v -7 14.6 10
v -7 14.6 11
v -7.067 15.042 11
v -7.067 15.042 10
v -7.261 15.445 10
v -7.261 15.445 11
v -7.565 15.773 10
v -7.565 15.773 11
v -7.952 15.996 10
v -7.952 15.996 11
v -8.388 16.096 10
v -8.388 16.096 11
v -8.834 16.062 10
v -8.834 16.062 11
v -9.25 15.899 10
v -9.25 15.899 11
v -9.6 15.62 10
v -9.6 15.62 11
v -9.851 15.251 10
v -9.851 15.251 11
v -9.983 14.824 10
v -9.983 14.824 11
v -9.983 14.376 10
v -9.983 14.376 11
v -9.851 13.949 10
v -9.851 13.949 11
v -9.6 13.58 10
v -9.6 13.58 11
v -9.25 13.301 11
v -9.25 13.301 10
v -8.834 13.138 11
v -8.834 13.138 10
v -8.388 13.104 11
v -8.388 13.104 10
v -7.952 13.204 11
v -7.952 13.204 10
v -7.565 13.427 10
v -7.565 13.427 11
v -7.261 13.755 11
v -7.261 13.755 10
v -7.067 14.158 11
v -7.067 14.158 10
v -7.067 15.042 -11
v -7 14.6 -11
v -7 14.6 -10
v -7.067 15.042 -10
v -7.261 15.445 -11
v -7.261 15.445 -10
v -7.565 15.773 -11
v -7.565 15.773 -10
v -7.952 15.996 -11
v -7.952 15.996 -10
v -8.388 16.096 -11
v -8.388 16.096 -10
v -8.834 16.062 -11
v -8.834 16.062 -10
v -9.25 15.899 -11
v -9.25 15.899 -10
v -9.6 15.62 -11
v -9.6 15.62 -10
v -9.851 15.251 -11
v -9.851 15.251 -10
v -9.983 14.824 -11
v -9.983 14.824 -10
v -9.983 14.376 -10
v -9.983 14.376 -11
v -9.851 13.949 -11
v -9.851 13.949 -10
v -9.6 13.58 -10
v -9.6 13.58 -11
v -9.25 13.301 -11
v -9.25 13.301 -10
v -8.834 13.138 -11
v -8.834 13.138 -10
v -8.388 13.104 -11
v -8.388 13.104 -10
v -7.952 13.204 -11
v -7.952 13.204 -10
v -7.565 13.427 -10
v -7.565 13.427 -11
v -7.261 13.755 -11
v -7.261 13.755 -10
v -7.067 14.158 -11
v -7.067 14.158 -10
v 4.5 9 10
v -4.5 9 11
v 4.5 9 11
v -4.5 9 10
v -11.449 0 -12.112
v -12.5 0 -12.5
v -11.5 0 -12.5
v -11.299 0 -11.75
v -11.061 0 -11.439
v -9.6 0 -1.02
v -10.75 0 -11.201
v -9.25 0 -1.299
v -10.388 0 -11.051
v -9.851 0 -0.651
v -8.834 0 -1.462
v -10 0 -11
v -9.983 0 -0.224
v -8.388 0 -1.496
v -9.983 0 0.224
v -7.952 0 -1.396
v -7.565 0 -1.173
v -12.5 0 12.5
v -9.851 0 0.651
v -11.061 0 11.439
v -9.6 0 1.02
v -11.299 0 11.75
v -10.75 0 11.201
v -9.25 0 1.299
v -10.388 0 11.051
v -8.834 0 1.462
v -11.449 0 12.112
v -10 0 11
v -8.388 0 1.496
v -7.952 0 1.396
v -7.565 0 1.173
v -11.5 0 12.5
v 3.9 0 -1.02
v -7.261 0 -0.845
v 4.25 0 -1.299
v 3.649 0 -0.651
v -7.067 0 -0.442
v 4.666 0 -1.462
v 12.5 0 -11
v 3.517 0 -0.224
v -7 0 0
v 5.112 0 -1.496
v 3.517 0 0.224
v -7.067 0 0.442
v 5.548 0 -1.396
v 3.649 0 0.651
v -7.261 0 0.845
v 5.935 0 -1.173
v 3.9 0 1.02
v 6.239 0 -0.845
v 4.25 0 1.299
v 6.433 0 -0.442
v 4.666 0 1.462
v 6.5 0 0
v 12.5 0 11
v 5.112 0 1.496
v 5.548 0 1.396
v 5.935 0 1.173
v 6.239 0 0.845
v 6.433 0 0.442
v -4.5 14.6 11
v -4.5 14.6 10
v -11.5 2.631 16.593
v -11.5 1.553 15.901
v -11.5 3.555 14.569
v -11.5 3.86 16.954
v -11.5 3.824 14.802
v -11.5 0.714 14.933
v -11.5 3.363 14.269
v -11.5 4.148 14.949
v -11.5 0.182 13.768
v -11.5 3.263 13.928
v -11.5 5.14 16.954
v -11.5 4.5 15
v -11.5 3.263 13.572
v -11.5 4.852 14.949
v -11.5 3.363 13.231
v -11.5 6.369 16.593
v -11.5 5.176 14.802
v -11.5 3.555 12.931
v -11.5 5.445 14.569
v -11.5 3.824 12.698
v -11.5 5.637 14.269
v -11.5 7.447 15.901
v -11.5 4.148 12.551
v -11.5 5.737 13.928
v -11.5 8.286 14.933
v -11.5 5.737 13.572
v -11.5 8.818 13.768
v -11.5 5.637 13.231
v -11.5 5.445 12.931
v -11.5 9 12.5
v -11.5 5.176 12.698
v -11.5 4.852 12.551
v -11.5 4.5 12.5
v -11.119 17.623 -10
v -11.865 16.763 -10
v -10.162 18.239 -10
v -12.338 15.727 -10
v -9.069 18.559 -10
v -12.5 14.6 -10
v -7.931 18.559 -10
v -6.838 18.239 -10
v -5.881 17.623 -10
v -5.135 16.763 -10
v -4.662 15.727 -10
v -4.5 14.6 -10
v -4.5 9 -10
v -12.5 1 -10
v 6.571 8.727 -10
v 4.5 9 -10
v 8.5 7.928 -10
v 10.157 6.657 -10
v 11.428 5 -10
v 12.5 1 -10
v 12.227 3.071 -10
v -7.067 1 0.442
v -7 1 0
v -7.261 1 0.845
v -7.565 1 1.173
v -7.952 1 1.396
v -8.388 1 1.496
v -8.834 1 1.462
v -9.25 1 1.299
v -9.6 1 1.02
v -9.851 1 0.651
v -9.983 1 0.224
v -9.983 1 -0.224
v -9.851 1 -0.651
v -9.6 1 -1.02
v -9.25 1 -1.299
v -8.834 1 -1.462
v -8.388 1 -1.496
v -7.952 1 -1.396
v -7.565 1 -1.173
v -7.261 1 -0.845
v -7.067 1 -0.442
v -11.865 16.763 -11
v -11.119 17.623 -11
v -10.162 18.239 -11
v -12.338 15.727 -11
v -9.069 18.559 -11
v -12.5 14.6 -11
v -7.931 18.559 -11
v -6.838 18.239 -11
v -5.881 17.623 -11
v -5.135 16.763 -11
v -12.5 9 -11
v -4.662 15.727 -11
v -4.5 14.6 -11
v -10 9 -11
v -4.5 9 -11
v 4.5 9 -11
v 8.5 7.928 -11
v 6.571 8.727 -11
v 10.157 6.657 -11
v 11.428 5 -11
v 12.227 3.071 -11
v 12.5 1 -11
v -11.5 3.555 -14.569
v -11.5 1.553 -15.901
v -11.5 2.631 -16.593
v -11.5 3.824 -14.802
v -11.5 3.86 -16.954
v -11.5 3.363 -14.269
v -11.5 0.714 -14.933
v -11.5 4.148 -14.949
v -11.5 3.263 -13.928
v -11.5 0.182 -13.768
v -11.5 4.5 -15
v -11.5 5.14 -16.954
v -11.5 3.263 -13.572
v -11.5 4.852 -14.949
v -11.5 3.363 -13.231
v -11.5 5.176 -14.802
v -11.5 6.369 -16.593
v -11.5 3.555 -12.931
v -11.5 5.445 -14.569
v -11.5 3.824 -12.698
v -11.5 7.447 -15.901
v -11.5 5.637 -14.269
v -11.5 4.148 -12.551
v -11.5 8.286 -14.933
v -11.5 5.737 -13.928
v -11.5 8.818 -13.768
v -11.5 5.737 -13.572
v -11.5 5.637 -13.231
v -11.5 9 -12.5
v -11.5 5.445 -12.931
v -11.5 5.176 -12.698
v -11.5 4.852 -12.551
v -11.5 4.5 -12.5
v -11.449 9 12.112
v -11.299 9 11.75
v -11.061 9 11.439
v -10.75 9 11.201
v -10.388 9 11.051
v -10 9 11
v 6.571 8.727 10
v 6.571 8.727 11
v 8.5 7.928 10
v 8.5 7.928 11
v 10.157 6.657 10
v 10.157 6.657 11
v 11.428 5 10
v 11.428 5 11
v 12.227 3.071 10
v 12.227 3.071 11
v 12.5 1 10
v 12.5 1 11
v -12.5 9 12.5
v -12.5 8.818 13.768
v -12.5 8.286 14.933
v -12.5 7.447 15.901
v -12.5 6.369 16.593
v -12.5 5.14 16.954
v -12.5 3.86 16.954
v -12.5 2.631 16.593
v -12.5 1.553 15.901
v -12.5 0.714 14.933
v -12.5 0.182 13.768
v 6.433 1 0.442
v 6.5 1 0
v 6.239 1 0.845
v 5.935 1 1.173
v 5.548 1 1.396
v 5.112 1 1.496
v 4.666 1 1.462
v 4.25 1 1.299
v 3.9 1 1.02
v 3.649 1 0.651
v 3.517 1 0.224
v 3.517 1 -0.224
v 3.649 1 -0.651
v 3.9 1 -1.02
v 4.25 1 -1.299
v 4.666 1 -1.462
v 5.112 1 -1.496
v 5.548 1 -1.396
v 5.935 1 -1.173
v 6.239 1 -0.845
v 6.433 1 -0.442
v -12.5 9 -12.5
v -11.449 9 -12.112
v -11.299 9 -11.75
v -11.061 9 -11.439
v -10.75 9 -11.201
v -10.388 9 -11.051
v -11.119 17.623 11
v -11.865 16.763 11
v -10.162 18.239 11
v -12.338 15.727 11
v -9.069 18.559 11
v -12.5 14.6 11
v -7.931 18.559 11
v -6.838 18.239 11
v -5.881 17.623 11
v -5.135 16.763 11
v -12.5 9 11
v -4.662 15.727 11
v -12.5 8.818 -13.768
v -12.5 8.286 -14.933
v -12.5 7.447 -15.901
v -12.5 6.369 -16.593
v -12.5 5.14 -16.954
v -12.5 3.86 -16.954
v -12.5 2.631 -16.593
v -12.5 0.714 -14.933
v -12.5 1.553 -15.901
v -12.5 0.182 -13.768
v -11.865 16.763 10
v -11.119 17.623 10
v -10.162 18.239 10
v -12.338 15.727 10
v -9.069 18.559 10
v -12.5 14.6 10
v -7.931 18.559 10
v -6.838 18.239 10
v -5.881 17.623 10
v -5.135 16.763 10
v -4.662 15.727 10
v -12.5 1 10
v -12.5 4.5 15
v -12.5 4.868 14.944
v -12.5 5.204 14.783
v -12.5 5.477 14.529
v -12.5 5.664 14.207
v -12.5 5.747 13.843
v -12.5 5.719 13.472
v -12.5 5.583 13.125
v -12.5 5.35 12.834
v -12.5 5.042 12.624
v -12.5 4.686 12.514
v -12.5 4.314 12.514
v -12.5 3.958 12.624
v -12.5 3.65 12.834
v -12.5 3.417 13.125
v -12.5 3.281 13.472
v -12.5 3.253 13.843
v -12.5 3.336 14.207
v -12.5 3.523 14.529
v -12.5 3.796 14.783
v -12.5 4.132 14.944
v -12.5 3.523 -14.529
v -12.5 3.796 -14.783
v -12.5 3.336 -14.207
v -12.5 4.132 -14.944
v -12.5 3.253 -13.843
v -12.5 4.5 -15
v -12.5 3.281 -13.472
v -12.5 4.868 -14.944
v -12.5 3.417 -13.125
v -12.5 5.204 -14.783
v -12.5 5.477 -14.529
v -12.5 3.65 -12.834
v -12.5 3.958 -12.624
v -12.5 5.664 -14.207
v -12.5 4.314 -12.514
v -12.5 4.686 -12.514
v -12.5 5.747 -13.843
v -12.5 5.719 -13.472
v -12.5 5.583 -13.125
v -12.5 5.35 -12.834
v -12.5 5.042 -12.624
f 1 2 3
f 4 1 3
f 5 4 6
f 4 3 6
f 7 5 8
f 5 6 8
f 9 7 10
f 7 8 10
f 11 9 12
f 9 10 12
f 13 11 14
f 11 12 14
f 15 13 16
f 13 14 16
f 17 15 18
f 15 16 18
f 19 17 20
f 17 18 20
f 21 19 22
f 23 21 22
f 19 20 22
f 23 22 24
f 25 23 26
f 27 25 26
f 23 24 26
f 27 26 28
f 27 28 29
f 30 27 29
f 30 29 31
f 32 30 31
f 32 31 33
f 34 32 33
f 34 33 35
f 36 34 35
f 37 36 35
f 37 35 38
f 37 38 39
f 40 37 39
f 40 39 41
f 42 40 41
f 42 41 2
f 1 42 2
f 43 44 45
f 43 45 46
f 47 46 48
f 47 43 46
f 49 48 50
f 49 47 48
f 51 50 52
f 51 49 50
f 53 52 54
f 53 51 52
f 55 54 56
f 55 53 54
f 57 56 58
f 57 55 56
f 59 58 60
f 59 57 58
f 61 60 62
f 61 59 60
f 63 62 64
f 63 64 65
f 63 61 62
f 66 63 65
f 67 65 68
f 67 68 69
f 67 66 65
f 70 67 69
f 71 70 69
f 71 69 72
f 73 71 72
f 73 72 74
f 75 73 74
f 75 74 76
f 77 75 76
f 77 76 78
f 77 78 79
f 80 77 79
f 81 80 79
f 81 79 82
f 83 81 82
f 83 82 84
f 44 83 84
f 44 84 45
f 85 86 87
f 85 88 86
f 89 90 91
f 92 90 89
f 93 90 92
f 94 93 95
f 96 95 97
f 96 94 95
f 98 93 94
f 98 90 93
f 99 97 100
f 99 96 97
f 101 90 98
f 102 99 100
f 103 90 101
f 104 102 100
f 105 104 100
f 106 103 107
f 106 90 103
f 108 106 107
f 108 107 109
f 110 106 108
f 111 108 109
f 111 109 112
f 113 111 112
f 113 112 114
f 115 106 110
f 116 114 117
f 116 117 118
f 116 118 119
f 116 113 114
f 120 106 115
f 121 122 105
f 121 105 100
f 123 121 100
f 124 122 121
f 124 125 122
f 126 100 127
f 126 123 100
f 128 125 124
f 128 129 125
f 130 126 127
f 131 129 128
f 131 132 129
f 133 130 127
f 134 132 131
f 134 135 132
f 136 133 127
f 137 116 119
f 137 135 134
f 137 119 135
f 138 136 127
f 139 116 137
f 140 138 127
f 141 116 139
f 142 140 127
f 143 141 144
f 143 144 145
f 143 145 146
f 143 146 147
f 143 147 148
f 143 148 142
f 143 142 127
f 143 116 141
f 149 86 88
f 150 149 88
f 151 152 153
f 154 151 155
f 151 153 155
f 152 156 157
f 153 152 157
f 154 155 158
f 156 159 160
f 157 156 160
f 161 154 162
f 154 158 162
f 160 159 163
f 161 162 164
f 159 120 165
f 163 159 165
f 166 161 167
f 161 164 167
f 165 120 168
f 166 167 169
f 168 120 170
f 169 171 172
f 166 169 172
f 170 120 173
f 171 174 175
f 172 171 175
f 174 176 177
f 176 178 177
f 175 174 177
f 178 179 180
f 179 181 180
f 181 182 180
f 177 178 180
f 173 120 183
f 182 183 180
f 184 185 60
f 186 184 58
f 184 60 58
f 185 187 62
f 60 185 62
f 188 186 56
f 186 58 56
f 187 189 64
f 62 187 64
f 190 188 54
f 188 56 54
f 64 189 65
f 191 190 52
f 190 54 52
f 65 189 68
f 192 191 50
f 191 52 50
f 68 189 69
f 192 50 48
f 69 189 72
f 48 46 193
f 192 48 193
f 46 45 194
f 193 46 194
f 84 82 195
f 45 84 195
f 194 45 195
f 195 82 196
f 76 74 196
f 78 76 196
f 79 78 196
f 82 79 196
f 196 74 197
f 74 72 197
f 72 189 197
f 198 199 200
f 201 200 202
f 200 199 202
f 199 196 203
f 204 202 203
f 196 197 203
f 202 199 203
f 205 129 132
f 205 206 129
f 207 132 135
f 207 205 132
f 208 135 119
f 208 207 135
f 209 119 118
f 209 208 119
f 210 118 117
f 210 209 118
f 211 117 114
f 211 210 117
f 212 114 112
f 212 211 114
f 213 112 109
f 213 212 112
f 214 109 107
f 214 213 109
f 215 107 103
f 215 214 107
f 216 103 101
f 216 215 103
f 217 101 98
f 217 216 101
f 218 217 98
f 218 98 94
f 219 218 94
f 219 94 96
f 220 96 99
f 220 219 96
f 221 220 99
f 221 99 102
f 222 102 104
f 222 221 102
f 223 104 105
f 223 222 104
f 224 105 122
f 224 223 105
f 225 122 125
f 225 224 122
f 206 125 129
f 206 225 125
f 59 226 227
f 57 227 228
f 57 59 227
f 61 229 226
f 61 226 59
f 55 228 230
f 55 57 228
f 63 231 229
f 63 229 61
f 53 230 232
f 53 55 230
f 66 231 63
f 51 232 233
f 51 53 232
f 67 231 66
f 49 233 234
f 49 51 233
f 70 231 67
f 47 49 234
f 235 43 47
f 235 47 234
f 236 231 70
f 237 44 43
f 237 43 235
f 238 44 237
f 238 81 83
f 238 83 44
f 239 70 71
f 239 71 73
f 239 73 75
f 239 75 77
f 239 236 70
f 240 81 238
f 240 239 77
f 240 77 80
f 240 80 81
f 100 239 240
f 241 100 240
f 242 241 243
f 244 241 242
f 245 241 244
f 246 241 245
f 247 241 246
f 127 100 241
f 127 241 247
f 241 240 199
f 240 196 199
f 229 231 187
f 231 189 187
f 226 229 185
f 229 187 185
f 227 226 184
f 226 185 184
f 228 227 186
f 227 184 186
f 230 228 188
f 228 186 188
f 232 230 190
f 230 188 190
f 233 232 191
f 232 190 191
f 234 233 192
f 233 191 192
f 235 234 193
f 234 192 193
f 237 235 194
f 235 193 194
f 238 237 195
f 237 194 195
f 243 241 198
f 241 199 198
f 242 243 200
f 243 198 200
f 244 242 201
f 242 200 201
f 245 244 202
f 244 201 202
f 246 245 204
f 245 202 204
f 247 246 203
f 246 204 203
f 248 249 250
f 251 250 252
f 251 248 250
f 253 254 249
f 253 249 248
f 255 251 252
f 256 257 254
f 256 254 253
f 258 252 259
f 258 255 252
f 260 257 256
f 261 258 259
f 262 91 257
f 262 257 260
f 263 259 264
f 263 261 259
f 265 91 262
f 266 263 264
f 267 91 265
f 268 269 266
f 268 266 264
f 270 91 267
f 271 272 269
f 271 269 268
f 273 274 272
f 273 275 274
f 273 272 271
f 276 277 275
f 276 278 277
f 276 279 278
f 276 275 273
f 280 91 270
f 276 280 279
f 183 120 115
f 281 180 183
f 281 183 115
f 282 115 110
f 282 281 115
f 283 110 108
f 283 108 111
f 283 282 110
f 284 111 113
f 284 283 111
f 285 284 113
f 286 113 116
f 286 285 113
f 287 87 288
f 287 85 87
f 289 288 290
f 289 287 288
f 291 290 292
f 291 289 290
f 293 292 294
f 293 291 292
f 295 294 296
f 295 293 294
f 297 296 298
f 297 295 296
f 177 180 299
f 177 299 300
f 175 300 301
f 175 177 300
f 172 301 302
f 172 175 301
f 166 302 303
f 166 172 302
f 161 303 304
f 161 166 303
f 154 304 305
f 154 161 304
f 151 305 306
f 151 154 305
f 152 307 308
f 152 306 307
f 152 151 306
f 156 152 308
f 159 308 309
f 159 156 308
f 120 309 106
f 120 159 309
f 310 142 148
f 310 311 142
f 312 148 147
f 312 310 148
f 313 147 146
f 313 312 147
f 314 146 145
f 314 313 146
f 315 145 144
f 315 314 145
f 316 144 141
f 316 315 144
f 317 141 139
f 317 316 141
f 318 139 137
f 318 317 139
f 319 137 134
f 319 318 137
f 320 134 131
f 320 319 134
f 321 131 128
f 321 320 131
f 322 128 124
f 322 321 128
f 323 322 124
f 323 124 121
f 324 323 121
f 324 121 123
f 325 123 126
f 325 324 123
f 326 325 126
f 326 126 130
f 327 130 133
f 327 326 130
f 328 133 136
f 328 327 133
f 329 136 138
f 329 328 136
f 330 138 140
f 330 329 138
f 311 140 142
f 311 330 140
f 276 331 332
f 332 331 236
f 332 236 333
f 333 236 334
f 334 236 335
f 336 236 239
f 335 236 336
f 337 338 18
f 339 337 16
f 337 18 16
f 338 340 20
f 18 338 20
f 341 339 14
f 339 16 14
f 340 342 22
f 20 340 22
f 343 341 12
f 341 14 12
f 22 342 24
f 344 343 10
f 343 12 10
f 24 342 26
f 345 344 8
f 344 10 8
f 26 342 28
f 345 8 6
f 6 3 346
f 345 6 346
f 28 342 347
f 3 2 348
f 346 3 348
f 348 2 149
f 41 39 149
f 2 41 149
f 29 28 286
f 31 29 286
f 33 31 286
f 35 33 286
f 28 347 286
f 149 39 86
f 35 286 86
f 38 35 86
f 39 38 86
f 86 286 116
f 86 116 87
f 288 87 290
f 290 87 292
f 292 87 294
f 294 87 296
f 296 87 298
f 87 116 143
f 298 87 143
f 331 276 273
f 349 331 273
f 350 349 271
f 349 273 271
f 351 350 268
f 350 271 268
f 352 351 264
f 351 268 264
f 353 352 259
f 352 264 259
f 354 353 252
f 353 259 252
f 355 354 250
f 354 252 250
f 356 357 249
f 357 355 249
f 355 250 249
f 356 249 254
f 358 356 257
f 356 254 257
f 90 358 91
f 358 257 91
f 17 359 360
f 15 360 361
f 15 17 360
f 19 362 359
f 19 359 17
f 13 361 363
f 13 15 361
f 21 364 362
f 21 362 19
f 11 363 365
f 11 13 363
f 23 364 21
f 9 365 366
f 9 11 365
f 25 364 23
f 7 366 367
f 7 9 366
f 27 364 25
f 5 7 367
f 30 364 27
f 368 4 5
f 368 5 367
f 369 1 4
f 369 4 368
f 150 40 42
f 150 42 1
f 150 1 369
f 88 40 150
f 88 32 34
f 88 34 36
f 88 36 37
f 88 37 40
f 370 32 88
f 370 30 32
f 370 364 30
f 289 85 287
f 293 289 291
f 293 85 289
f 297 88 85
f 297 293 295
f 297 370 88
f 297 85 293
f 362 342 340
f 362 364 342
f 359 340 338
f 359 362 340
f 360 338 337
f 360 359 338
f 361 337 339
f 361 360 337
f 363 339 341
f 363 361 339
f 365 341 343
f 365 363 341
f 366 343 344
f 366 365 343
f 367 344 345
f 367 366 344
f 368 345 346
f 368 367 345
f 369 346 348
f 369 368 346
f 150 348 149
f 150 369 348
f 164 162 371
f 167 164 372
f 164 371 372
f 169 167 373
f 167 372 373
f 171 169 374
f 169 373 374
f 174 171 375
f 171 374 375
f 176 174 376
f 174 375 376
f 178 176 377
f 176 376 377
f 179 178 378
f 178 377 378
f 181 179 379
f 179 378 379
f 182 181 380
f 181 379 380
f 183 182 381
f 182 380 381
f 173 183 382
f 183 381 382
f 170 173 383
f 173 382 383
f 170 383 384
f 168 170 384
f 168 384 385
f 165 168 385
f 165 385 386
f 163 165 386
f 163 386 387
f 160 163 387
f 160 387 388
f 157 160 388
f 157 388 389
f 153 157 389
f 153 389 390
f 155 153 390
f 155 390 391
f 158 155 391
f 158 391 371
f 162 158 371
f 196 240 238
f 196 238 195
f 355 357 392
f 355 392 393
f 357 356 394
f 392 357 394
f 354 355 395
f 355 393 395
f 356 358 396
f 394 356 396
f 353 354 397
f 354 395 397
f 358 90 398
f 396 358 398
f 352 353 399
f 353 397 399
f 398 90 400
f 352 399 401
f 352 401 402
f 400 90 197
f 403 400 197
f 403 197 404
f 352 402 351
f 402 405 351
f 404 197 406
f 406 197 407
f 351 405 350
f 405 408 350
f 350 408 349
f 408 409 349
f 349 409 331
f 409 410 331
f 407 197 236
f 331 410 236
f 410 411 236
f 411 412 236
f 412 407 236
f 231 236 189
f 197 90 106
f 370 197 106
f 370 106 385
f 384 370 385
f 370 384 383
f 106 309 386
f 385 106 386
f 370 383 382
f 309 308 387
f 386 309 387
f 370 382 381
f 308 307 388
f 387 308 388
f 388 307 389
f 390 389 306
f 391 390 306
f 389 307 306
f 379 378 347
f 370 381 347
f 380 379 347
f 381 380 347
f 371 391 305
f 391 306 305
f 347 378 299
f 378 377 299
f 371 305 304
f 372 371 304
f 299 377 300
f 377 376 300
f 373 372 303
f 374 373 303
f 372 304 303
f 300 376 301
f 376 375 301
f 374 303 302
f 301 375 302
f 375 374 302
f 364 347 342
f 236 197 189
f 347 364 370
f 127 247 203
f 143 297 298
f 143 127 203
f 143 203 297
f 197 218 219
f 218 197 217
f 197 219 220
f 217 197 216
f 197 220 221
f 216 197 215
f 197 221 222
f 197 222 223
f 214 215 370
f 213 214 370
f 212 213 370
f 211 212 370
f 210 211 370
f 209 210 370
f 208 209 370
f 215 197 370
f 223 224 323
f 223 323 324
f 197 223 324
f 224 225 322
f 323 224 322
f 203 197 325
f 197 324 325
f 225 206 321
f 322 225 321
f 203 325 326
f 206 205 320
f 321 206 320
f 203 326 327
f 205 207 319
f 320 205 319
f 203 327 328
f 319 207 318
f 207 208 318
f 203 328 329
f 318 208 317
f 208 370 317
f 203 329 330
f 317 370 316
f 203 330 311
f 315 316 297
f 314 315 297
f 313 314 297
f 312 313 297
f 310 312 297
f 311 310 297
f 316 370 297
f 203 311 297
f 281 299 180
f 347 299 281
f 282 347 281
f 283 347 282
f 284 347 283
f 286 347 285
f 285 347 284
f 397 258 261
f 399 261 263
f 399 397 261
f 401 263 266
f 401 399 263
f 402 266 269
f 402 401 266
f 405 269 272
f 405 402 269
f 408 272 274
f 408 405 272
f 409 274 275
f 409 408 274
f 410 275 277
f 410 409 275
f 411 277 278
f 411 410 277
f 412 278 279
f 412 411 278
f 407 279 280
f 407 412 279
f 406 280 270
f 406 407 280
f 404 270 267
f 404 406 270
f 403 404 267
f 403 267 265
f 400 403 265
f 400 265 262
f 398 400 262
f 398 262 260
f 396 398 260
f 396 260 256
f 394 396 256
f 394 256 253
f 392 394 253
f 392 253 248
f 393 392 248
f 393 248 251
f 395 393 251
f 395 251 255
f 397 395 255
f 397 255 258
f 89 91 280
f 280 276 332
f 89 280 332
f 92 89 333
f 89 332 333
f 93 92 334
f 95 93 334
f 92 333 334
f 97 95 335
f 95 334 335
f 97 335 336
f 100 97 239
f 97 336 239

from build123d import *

# Parameters (mm, degrees)
CROQUIS1_W              = 25
CROQUIS1_H              = 22
SALIENTE_EXTRUIR1_DEPTH = 1
CROQUIS2_W              = 8
CROQUIS2_H              = 1
SALIENTE_EXTRUIR2_DEPTH = 17.6
CROQUIS2_3_W            = 17
CROQUIS2_3_H            = 1
SALIENTE_EXTRUIR3_DEPTH = 8
REDONDEO2_RADIUS        = 4
REDONDEO2_LENGTH        = 1
REDONDEO3_R             = 8
REDONDEO4_RADIUS        = 4
REDONDEO4_LENGTH        = 1
CROQUIS4_R              = 1.5
CORTAR_EXTRUIR1_DEPTH   = 32.403980639
CROQUIS5_R              = 1.5
CORTAR_EXTRUIR2_DEPTH   = 25.22828925
CROQUIS6_W              = 1
CROQUIS6_H              = 9
SALIENTE_EXTRUIR4_DEPTH = 6
REDONDEO5_RADIUS        = 4.5
REDONDEO5_LENGTH        = 1
REDONDEO6_R             = 1.5
CORTAR_EXTRUIR3_REACH   = 37.496
CROQUIS7_R              = 1.25
CROQUIS8_W              = 25
CROQUIS8_H              = 11
CORTAR_EXTRUIR4_DEPTH   = 29.128455343


with BuildPart() as part:
    # Croquis1 → Saliente-Extruir1 (new body)
    with BuildSketch(Plane(origin=(0, 0, 0), x_dir=(1, 0, 0), z_dir=(0, 1, 0))):
        Rectangle(CROQUIS1_W, CROQUIS1_H)
    extrude(amount=SALIENTE_EXTRUIR1_DEPTH)

    # Croquis2 → Saliente-Extruir2 (add)
    with BuildSketch(Plane(origin=(0, 1, 0), x_dir=(1, 0, 0), z_dir=(0, 1, 0))):
        with Locations((-8.5, -10.5)):
            Rectangle(CROQUIS2_W, CROQUIS2_H)
        with Locations((-8.5, 10.5)):
            Rectangle(CROQUIS2_W, CROQUIS2_H)
    extrude(amount=SALIENTE_EXTRUIR2_DEPTH)

    # Croquis2<3> → Saliente-Extruir3 (add)
    with BuildSketch(Plane(origin=(0, 1, 0), x_dir=(1, 0, 0), z_dir=(0, 1, 0))):
        with Locations((4, 10.5)):
            Rectangle(CROQUIS2_3_W, CROQUIS2_3_H)
        with Locations((4, -10.5)):
            Rectangle(CROQUIS2_3_W, CROQUIS2_3_H)
    extrude(amount=SALIENTE_EXTRUIR3_DEPTH)

    # Redondeo2: full round fillet: the end face becomes a half cylinder, R = half its width
    redondeo2_face = Plane((-8.5, 18.6, 10.5), x_dir=(0, 0, -1), z_dir=(0, 1, 0))  # on the end face: x along it, z out of the body
    redondeo2_slab = redondeo2_face.offset(-REDONDEO2_RADIUS / 2) * Box(REDONDEO2_LENGTH, 2 * REDONDEO2_RADIUS, REDONDEO2_RADIUS, mode=Mode.PRIVATE)  # the body's end, R deep
    redondeo2_round = Plane((-8.5, 14.6, 10.5), x_dir=(0, 1, 0), z_dir=(0, 0, -1)) * Cylinder(REDONDEO2_RADIUS, REDONDEO2_LENGTH, mode=Mode.PRIVATE)  # its axis R under the face
    add(redondeo2_slab - redondeo2_round, mode=Mode.SUBTRACT)

    # Redondeo3
    redondeo3_edges = [part.edges().sort_by_distance(p)[0] for p in [
        (12.5, 9, 10.5),
        (12.5, 9, -10.5),
    ]]
    fillet(redondeo3_edges, radius=REDONDEO3_R)

    # Redondeo4: full round fillet: the end face becomes a half cylinder, R = half its width
    redondeo4_face = Plane((-8.5, 18.6, -10.5), x_dir=(0, 0, -1), z_dir=(0, 1, 0))  # on the end face: x along it, z out of the body
    redondeo4_slab = redondeo4_face.offset(-REDONDEO4_RADIUS / 2) * Box(REDONDEO4_LENGTH, 2 * REDONDEO4_RADIUS, REDONDEO4_RADIUS, mode=Mode.PRIVATE)  # the body's end, R deep
    redondeo4_round = Plane((-8.5, 14.6, -10.5), x_dir=(0, 1, 0), z_dir=(0, 0, -1)) * Cylinder(REDONDEO4_RADIUS, REDONDEO4_LENGTH, mode=Mode.PRIVATE)  # its axis R under the face
    add(redondeo4_slab - redondeo4_round, mode=Mode.SUBTRACT)

    # Croquis4 → Cortar-Extruir1 (cut, through all)
    with BuildSketch(Plane.XY.offset(11)):
        with Locations((-8.5, 14.6)):
            Circle(CROQUIS4_R)
    extrude(amount=-CORTAR_EXTRUIR1_DEPTH, mode=Mode.SUBTRACT)

    # Croquis5 → Cortar-Extruir2 (cut, through all)
    with BuildSketch(Plane(origin=(0, 1, 0), x_dir=(1, 0, 0), z_dir=(0, 1, 0))):
        with Locations(Location((5, 0, 0), (0, 0, 270))):
            Circle(CROQUIS5_R)
        with Locations(Location((-8.5, 0, 0), (0, 0, 270))):
            Circle(CROQUIS5_R)
    extrude(amount=-CORTAR_EXTRUIR2_DEPTH, mode=Mode.SUBTRACT)

    # Croquis6 → Saliente-Extruir4 (add)
    with BuildSketch(Plane.XY.offset(11)):
        with Locations((-12, 4.5)):
            Rectangle(CROQUIS6_W, CROQUIS6_H)
    extrude(amount=SALIENTE_EXTRUIR4_DEPTH)

    # Redondeo5: full round fillet: the end face becomes a half cylinder, R = half its width
    redondeo5_face = Plane((-12, 4.5, 17), x_dir=(1, 0, 0), z_dir=(0, 0, 1))  # on the end face: x along it, z out of the body
    redondeo5_slab = redondeo5_face.offset(-REDONDEO5_RADIUS / 2) * Box(REDONDEO5_LENGTH, 2 * REDONDEO5_RADIUS, REDONDEO5_RADIUS, mode=Mode.PRIVATE)  # the body's end, R deep
    redondeo5_round = Plane((-12, 4.5, 12.5), x_dir=(0, 0, 1), z_dir=(1, 0, 0)) * Cylinder(REDONDEO5_RADIUS, REDONDEO5_LENGTH, mode=Mode.PRIVATE)  # its axis R under the face
    add(redondeo5_slab - redondeo5_round, mode=Mode.SUBTRACT)

    # Redondeo6
    redondeo6_edges = [part.edges().sort_by_distance(p)[0] for p in [
        (-11.5, 4.5, 11),
    ]]
    fillet(redondeo6_edges, radius=REDONDEO6_R)

    # Croquis7 → Cortar-Extruir3 (cut, up to next)
    with BuildSketch(Plane.ZY.offset(12.5), mode=Mode.PRIVATE) as cortar_extruir3_sk1:
        with Locations((13.75, 4.5)):
            Circle(CROQUIS7_R)
    cortar_extruir3_tool1 = extrude(cortar_extruir3_sk1.sketch, amount=-CORTAR_EXTRUIR3_REACH, mode=Mode.PRIVATE) & part.part
    add(cortar_extruir3_tool1.solids().sort_by_distance((-12.5, 4.5, 13.75))[0], mode=Mode.SUBTRACT)

    # Croquis8 → Cortar-Extruir4 (cut, through all)
    with BuildSketch(Plane.XZ):
        with Locations((0, -5.5)):
            Rectangle(CROQUIS8_W, CROQUIS8_H)
    extrude(amount=-CORTAR_EXTRUIR4_DEPTH, mode=Mode.SUBTRACT)

    # Simetría1: part across plane


with BuildPart() as part_1:
    add(part.part)
    add(part.part.mirror(Plane.XY))


solid = part_1.part
